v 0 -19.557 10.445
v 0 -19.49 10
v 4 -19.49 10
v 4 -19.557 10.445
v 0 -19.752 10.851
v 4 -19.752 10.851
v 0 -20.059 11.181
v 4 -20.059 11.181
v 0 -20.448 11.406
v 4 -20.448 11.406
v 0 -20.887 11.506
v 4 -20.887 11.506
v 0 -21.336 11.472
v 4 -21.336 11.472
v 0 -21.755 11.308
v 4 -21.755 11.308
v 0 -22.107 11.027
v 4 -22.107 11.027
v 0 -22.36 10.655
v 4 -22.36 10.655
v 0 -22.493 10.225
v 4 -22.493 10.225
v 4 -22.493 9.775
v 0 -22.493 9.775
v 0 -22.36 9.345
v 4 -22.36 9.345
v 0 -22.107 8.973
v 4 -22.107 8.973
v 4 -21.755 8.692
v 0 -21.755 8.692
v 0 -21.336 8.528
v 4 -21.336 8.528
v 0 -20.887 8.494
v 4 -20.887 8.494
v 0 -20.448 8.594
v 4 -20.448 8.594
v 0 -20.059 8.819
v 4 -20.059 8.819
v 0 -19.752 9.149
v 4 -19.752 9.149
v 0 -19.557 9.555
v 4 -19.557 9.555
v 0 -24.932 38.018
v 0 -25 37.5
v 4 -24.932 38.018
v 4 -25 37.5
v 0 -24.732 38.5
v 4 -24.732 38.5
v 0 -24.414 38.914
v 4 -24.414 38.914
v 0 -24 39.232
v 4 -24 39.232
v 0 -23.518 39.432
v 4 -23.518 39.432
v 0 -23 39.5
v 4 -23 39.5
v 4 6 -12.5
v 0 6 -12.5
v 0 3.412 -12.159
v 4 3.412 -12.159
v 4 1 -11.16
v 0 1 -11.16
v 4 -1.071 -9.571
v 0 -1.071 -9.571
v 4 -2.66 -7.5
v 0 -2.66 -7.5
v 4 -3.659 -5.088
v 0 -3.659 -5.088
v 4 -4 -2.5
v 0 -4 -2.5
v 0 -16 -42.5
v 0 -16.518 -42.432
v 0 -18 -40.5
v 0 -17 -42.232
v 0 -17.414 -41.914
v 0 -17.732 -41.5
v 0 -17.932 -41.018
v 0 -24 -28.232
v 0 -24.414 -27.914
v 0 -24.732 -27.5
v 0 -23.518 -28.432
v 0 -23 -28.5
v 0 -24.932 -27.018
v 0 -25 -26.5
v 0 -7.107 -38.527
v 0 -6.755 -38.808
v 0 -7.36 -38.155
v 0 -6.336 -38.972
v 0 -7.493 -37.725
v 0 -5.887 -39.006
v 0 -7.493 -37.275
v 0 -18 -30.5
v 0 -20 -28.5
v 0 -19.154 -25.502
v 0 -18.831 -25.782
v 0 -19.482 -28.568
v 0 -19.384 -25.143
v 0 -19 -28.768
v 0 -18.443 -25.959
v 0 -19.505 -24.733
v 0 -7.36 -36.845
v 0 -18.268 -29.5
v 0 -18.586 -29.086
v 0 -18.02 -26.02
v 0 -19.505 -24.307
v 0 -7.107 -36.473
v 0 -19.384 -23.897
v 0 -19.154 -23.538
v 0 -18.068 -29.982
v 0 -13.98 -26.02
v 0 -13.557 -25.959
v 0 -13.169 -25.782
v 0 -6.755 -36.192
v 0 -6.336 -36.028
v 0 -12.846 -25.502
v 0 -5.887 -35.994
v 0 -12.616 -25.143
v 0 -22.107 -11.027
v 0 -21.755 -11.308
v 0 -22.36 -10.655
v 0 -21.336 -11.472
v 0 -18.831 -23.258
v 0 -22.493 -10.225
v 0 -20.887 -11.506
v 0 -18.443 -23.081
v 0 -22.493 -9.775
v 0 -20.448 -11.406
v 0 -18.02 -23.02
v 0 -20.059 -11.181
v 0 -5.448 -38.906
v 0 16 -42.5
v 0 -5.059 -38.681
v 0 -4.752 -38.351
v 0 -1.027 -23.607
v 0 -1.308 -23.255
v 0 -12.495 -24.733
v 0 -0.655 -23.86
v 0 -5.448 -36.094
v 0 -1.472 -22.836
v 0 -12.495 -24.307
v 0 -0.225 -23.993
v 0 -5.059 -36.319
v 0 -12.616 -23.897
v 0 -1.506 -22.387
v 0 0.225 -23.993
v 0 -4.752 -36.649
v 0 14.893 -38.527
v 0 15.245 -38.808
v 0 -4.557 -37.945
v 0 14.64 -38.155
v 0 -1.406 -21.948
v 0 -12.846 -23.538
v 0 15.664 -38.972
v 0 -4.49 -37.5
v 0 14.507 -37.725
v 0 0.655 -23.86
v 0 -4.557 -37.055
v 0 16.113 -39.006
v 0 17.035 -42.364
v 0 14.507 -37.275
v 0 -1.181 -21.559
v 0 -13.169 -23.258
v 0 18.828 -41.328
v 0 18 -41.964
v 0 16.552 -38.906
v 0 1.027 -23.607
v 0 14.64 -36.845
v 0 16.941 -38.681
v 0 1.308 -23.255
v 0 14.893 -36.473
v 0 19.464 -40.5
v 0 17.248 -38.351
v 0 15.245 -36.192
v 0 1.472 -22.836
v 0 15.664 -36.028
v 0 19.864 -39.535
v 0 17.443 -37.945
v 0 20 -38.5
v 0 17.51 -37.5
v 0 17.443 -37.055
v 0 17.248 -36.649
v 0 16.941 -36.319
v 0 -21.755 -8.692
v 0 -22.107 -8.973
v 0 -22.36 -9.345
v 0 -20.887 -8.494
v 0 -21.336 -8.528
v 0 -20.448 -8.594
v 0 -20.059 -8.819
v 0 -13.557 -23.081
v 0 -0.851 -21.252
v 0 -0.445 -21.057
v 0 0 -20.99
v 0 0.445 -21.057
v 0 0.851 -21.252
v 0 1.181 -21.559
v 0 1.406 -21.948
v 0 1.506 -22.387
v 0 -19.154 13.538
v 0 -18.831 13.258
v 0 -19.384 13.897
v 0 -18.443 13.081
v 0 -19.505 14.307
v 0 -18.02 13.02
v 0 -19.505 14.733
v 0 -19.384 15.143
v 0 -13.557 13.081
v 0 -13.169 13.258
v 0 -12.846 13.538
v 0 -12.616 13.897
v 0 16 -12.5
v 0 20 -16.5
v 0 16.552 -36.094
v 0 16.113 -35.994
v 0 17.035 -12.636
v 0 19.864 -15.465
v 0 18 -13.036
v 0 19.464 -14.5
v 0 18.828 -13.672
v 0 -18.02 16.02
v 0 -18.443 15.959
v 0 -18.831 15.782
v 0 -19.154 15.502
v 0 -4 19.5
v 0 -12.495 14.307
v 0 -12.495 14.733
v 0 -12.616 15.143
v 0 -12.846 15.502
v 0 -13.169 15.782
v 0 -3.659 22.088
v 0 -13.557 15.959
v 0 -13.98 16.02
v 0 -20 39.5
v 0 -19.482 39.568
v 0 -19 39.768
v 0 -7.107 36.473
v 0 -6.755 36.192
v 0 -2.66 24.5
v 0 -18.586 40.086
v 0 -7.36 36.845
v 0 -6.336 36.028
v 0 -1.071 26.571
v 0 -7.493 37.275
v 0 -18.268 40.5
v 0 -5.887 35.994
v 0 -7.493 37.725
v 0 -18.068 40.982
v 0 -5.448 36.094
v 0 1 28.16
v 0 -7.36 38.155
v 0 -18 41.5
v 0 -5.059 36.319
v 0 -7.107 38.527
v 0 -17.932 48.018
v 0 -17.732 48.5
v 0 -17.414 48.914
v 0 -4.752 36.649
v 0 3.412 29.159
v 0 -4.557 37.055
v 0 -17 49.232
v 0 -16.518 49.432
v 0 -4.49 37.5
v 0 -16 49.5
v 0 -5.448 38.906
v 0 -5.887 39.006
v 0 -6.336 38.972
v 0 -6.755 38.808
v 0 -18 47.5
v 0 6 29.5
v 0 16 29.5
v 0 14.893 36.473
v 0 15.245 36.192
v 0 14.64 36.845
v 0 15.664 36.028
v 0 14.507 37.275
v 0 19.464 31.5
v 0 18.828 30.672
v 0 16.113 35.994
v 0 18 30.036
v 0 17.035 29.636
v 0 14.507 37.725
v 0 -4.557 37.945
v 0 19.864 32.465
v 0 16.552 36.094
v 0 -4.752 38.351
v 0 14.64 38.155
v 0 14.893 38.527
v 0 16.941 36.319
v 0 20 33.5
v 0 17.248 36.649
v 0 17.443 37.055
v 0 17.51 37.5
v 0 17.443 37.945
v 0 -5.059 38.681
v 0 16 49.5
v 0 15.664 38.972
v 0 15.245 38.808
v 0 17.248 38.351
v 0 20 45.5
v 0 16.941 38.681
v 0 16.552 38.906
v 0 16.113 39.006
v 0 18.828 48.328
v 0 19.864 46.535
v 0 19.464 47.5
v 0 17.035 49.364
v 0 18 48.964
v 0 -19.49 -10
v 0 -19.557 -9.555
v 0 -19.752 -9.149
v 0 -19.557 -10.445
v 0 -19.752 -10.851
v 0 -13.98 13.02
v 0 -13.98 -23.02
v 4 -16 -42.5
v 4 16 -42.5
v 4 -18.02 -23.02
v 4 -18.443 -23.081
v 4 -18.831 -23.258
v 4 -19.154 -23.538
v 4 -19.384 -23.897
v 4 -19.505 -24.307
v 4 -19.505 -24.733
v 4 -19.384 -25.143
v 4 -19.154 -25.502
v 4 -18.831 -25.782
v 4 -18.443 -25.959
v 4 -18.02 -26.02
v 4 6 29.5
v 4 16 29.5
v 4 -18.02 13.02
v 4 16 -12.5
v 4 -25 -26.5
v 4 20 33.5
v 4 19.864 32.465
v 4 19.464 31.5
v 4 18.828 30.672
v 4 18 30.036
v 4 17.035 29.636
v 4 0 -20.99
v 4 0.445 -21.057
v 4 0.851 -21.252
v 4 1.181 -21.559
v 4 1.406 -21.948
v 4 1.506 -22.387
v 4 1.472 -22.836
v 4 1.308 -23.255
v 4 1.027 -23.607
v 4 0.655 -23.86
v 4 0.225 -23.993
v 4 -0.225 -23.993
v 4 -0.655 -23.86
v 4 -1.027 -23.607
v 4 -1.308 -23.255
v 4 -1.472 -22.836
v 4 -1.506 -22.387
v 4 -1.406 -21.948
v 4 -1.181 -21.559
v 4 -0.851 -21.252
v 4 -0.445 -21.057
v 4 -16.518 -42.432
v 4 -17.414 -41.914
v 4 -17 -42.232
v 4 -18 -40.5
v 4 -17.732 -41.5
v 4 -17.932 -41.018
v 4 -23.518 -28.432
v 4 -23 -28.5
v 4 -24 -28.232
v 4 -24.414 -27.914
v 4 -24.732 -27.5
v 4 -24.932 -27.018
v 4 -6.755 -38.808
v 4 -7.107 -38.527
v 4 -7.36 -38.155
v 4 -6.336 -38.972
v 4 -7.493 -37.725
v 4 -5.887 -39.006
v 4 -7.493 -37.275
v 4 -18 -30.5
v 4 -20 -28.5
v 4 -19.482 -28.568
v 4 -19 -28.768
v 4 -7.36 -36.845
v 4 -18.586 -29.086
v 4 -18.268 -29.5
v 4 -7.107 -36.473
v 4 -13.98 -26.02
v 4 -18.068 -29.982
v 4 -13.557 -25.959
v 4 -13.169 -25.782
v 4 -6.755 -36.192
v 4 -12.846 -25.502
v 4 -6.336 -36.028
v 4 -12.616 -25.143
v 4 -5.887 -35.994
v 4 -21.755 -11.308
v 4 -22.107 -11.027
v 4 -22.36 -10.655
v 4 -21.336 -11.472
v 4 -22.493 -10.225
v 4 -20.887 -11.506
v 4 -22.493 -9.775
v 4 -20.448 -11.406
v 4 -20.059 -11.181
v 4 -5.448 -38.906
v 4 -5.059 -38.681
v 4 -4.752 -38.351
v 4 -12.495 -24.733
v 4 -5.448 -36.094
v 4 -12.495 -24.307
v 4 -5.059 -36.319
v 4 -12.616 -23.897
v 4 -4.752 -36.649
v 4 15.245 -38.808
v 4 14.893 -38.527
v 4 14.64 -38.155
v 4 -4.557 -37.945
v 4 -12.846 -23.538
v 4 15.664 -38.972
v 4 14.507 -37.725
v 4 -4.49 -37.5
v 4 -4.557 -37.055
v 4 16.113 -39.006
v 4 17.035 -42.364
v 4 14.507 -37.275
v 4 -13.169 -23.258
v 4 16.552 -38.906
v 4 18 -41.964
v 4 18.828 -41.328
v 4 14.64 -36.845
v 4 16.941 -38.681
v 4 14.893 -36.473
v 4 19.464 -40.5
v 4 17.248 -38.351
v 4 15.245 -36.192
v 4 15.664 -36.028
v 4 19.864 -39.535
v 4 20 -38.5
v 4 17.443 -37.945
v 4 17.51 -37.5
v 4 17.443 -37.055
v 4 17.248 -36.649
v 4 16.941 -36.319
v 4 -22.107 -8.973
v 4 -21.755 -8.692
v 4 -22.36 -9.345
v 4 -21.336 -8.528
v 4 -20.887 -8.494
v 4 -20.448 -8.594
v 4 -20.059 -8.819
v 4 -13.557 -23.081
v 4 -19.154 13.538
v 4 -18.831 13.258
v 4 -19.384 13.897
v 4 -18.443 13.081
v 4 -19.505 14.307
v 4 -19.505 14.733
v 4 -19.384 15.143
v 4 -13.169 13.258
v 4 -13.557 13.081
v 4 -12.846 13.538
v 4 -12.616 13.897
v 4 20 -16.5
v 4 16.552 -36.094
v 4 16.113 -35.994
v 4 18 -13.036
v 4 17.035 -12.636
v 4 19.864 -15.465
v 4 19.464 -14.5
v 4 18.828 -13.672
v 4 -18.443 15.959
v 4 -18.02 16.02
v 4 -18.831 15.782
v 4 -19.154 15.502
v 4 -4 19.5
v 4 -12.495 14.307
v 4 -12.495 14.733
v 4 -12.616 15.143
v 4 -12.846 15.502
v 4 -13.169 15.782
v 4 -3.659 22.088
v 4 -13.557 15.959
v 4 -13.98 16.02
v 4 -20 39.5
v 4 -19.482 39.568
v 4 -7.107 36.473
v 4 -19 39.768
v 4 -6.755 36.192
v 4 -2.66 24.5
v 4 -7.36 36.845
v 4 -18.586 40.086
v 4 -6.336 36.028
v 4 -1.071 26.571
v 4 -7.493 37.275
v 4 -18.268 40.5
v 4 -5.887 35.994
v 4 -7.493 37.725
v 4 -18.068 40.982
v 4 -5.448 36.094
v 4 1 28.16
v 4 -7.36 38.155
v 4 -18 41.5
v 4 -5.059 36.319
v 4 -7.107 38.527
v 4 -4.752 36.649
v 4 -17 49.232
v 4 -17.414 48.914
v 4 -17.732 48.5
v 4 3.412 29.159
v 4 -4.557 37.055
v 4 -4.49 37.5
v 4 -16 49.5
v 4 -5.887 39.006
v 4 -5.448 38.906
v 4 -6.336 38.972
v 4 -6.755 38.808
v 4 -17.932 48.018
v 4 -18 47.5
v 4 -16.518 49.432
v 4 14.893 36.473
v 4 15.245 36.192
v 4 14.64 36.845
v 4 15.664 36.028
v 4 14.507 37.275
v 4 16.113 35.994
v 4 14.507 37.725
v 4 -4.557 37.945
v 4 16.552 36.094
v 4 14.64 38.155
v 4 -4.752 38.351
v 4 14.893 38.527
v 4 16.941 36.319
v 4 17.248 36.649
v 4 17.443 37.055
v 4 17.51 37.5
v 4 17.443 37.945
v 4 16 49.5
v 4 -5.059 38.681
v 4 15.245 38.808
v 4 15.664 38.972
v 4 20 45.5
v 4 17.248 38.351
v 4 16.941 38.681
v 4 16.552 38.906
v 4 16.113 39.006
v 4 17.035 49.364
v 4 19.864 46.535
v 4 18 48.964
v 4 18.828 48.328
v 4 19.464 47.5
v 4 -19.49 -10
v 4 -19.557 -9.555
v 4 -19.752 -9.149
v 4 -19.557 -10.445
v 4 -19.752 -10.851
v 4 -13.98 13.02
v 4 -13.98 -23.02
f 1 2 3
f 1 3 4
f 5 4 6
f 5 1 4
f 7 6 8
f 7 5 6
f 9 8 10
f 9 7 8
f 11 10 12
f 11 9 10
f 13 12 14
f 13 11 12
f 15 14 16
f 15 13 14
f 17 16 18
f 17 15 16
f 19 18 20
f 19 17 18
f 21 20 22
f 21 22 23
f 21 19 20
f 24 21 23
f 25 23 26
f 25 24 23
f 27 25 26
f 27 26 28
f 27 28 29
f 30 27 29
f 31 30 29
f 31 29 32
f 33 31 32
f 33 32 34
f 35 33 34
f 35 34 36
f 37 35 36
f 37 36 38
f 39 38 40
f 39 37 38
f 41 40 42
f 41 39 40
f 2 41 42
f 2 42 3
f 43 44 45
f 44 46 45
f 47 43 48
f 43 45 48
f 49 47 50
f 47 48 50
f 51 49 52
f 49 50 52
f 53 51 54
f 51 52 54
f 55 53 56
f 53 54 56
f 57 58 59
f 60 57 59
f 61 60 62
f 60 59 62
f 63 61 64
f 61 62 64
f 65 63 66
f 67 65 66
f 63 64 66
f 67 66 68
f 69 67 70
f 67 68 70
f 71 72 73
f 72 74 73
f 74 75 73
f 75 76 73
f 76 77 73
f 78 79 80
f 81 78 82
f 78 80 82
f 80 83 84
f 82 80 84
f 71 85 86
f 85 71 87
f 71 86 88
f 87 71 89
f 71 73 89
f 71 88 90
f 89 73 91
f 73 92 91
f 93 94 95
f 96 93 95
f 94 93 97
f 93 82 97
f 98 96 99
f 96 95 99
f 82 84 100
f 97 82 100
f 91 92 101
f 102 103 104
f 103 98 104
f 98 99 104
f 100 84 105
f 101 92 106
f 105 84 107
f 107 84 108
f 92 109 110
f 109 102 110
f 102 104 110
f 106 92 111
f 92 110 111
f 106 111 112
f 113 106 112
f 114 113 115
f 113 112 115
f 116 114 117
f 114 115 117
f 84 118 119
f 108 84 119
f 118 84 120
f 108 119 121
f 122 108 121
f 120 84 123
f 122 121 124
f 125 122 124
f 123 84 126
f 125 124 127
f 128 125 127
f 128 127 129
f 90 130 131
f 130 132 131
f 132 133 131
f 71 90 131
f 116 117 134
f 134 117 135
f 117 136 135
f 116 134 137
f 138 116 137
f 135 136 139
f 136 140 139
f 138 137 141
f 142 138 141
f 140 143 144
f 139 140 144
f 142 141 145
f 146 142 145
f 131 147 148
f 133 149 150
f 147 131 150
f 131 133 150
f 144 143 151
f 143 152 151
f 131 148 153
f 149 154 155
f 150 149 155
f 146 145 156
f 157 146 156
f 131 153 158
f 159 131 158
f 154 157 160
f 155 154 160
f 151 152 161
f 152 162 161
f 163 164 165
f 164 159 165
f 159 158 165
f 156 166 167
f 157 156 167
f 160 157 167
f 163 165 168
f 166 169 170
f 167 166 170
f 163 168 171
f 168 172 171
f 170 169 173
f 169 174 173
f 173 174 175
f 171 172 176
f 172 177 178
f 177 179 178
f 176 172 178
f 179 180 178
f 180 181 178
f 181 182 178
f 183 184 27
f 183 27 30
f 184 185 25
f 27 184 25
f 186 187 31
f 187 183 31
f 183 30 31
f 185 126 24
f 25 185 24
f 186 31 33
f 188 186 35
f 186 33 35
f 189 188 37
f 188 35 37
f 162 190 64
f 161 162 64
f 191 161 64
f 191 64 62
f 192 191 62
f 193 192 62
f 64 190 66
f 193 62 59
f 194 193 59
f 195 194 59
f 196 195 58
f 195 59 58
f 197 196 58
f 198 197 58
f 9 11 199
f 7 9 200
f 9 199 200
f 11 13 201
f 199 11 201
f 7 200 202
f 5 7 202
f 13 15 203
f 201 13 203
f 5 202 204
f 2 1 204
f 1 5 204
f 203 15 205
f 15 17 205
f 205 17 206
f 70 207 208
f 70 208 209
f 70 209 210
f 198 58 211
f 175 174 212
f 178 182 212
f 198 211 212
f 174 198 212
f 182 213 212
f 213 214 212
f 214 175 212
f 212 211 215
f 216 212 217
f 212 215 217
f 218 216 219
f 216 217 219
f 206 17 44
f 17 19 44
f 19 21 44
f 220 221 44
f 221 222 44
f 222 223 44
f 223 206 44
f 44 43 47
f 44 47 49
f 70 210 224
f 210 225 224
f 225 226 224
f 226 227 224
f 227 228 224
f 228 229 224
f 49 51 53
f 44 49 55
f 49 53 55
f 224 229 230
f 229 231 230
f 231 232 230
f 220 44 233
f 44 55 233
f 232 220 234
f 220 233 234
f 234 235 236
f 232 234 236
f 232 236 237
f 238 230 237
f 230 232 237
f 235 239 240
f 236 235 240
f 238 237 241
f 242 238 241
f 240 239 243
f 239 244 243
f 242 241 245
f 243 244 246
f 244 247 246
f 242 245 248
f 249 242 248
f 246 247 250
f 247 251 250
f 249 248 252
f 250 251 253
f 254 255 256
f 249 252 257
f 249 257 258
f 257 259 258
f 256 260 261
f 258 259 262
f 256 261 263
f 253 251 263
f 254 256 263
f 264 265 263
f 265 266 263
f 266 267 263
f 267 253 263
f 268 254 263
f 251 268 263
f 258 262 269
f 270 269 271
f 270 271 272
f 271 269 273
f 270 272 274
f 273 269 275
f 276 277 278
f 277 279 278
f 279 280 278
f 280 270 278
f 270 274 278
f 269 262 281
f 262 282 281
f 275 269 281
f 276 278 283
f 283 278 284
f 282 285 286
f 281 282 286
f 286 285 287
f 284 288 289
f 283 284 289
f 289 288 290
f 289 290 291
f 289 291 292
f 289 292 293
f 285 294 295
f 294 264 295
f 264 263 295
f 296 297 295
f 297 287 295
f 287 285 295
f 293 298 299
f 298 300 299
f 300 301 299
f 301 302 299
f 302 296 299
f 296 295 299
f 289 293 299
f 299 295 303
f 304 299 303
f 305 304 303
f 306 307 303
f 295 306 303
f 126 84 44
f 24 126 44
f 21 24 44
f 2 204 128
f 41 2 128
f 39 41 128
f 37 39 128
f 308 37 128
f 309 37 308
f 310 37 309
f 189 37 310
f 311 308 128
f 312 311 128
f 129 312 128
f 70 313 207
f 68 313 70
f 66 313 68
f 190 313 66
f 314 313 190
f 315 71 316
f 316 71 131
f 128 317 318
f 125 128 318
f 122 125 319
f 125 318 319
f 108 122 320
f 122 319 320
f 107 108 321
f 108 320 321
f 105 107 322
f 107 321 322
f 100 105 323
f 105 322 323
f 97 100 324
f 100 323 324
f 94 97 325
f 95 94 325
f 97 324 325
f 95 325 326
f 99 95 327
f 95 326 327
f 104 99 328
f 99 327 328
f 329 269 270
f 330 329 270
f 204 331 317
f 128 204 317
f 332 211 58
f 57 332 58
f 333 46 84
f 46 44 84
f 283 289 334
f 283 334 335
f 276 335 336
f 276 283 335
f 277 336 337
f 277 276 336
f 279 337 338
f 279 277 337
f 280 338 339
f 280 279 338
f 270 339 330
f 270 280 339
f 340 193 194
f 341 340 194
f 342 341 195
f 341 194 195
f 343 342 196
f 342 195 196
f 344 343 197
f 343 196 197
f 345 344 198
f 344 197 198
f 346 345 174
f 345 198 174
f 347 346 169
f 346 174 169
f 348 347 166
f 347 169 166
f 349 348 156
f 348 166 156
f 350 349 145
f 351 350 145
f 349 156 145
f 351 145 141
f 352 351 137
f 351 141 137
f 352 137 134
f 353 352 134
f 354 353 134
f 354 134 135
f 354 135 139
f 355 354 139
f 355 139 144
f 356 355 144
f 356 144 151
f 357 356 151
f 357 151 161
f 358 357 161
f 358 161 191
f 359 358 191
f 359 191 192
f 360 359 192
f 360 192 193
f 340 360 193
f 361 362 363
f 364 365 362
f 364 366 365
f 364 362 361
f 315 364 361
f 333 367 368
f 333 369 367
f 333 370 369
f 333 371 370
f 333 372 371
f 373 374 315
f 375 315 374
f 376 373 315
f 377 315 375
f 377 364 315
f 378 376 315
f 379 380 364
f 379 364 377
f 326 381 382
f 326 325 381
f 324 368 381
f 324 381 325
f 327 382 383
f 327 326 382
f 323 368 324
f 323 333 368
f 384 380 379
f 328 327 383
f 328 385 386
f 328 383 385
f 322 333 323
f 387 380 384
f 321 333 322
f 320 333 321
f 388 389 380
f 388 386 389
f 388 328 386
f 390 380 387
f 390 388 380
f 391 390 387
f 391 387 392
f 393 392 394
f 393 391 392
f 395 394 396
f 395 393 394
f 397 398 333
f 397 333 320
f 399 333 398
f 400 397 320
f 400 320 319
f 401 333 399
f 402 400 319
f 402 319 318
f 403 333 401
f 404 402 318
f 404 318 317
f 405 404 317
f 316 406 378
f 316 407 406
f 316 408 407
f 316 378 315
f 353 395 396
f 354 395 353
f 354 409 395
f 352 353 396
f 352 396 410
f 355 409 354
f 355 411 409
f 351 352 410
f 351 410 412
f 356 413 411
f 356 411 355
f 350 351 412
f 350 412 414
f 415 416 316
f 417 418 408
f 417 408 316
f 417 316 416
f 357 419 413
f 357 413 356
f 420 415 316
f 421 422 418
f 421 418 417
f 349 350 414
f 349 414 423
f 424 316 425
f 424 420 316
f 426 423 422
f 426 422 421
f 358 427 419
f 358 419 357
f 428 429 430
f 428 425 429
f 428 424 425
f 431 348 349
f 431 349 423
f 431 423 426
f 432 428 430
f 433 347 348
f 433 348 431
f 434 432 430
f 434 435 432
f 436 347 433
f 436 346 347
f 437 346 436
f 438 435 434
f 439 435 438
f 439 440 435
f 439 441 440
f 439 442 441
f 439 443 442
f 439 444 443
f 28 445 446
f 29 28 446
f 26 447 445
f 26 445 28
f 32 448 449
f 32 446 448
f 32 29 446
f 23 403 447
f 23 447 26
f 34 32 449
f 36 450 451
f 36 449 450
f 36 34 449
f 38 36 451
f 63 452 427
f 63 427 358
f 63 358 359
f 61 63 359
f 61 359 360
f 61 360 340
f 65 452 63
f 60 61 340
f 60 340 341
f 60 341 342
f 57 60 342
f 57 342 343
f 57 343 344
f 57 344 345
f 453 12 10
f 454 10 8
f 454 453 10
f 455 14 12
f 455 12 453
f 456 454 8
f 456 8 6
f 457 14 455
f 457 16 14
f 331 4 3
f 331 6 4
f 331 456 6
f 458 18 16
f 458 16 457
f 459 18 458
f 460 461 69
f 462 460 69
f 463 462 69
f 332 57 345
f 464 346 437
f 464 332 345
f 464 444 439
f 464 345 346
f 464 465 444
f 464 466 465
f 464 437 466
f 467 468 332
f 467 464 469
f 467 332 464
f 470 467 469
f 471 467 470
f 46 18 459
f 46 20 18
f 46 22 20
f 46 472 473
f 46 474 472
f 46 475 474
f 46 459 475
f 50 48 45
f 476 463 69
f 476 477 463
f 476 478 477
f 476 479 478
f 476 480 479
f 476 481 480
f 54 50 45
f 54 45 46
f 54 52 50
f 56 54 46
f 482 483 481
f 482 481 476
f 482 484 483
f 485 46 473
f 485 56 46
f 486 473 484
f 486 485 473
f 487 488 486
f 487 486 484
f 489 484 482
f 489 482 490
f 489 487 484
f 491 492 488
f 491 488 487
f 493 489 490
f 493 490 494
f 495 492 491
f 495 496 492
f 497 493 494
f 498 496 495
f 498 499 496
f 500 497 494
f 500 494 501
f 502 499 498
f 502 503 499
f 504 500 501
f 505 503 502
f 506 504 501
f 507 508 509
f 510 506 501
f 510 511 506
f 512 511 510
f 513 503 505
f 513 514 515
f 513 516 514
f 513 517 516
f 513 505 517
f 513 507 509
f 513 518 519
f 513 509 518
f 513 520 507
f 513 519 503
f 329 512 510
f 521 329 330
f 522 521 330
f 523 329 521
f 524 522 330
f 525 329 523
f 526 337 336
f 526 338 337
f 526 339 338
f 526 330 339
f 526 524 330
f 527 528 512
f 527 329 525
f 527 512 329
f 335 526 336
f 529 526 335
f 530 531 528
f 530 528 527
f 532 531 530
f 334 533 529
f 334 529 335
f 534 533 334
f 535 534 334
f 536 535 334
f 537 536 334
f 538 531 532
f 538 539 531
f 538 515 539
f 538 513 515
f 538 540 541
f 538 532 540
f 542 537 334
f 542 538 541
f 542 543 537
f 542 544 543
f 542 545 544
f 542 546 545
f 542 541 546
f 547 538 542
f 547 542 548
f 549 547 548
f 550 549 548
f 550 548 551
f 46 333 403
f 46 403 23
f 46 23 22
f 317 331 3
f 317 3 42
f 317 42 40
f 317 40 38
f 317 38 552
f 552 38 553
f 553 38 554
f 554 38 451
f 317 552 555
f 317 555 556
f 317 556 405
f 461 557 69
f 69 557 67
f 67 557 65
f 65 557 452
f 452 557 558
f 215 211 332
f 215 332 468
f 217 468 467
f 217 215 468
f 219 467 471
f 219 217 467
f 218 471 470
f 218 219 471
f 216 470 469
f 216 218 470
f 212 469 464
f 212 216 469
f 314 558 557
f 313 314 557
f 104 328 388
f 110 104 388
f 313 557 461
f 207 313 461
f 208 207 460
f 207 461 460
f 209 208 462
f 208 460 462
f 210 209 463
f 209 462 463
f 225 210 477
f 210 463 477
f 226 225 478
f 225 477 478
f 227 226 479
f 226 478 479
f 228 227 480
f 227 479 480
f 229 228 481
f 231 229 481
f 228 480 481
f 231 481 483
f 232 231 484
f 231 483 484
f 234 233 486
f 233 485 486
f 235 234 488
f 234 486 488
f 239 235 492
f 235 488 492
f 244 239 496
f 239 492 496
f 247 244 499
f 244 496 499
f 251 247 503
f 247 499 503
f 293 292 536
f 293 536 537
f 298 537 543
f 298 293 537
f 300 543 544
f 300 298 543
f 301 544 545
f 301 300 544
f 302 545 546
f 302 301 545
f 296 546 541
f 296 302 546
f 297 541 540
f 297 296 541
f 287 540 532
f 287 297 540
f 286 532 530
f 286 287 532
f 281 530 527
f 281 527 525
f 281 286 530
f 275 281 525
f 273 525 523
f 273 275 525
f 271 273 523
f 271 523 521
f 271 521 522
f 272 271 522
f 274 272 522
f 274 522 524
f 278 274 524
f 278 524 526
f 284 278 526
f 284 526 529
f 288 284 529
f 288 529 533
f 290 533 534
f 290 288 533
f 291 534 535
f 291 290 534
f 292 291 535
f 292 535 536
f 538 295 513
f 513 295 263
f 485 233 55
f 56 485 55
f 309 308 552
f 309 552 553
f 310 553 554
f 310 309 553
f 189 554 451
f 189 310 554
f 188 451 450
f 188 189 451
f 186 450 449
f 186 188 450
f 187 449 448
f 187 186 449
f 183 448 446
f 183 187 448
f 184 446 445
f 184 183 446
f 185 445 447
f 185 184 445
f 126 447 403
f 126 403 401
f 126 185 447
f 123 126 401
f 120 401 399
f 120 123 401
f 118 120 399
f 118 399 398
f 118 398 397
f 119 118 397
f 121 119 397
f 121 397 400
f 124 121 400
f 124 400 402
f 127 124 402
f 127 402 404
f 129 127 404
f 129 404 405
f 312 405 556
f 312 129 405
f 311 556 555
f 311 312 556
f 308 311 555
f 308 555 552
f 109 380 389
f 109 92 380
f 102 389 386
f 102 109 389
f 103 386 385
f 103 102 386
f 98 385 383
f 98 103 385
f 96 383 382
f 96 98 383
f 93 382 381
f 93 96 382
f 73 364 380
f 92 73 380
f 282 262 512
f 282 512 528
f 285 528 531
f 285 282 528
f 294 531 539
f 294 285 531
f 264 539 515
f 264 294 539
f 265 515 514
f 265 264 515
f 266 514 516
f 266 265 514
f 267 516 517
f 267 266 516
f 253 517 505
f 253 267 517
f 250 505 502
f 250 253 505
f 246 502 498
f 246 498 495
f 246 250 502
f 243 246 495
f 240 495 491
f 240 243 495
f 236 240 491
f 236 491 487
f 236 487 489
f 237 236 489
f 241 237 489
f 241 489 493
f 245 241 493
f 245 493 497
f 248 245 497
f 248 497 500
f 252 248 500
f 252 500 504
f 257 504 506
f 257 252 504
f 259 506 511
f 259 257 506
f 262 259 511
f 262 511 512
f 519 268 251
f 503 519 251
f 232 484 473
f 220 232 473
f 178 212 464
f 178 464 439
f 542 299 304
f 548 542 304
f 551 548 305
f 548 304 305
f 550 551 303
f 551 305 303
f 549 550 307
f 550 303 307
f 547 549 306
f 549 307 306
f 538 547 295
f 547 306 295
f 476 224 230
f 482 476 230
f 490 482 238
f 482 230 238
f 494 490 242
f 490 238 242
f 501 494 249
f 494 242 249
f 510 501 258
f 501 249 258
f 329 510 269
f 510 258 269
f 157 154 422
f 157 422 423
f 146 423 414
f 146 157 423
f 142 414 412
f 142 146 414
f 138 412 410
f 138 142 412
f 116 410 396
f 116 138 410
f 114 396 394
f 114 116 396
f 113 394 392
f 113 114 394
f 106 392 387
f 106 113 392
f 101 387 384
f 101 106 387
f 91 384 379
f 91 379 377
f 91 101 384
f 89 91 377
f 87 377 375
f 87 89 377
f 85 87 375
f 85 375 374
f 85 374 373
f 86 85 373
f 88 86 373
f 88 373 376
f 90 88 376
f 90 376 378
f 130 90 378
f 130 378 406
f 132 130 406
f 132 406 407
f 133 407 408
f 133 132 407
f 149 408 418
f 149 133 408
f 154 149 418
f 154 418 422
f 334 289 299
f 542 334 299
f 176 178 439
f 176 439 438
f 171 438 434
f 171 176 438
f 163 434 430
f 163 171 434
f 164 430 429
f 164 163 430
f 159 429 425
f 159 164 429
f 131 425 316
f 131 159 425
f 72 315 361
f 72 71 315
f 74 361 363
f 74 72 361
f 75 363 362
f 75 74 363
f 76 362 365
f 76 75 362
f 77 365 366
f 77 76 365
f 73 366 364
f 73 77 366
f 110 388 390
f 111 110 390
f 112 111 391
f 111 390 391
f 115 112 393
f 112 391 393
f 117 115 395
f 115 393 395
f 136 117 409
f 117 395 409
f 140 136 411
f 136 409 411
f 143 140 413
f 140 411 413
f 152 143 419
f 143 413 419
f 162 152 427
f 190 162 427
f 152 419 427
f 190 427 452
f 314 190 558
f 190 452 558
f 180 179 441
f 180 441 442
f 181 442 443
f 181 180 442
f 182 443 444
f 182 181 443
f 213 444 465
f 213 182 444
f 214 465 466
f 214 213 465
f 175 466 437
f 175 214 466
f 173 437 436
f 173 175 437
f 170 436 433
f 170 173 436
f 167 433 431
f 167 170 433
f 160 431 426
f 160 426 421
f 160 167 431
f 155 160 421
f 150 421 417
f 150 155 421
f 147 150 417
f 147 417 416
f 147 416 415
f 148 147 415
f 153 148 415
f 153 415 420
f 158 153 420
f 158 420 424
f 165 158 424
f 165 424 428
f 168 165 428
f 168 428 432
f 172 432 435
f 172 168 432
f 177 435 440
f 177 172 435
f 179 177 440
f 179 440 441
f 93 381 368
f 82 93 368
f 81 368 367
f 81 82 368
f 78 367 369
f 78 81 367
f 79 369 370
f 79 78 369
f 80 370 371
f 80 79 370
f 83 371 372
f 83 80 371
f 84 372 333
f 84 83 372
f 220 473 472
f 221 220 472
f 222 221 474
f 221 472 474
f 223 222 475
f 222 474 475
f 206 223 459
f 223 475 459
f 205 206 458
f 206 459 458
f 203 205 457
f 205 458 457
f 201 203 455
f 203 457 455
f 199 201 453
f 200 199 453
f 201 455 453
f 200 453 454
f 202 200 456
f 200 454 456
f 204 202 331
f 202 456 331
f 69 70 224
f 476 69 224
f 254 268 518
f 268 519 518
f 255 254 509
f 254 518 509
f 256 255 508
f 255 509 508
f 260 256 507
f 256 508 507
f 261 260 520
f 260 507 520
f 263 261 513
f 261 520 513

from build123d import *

# Parameters (mm, degrees)
SKETCH_1_W              = 85
SKETCH_1_H              = 40
EXTRUDE_1_DEPTH         = 4
SKETCH_2_R              = 1.51
CUT_EXTRUDE_1_DEPTH     = 10
SKETCH_3_R              = 1.51
CUT_EXTRUDE_2_DEPTH     = 10
SKETCH_5_R              = 1.51
CUT_EXTRUDE_4_DEPTH     = 10
SKETCH_6_W              = 85
SKETCH_6_H              = 25
EXTRUDE_2_DEPTH         = 4
SKETCH_7_R              = 1.51
CUT_EXTRUDE_5_DEPTH     = 3
CUT_EXTRUDE_START       = -3
SKETCH_8_R              = 1.51
CUT_EXTRUDE_6_DEPTH     = 3
CUT_EXTRUDE_7_DEPTH     = 10
SKETCH_10_R             = 1.5
CUT_EXTRUDE_8_DEPTH     = 10
SKETCH_12_OUTSIDE_W     = 108.416
SKETCH_12_OUTSIDE_H     = 88.416
CUT_EXTRUDE_9_DEPTH     = 10
SKETCH_13_W             = 85
SKETCH_13_H             = 20
CUT_EXTRUDE_10_DEPTH    = 10
FILLET_2_R              = 4
MOVE_FACE_1_DEPTH       = 4
MOVE_FACE_2_OUTLINE_R   = 1.51
MOVE_FACE_2_DEPTH       = 4
MOVE_FACE_2_2_OUTLINE_R = 1.51
MOVE_FACE_2_2_DEPTH     = 4
MOVE_FACE_3_OUTLINE_R   = 1.51
MOVE_FACE_3_DEPTH       = 4
MOVE_FACE_3_2_OUTLINE_R = 1.51
MOVE_FACE_3_2_DEPTH     = 4
CUT_EXTRUDE_11_DEPTH    = 10
FILLET_3_R              = 2
CUT_EXTRUDE_12_DEPTH    = 10
FILLET_4_R              = 2


# Read off the part's stored shape, not the designer's step: 移动面1, 移动面2, 移动面3
with BuildPart() as part:
    # 草图1 → 凸台-拉伸1 (new body)
    with BuildSketch(Plane(origin=(0, 0, 0), x_dir=(0, 0, -1), z_dir=(1, 0, 0))):
        Rectangle(SKETCH_1_W, SKETCH_1_H)
    extrude(amount=EXTRUDE_1_DEPTH)

    # 草图2 → 切除-拉伸1 (cut)
    with BuildSketch(Plane.ZY):
        with Locations((-37.5, -11)):
            Circle(SKETCH_2_R)
        with Locations((37.5, -11)):
            Circle(SKETCH_2_R)
        with Locations((37.5, 11)):
            Circle(SKETCH_2_R)
        with Locations((-37.5, 11)):
            Circle(SKETCH_2_R)
    extrude(amount=-CUT_EXTRUDE_1_DEPTH, mode=Mode.SUBTRACT)

    # 草图3 → 切除-拉伸2 (cut)
    with BuildSketch(Plane.ZY):
        with Locations((-2.5, 0)):
            Circle(SKETCH_3_R)
        with Locations((-22.5, 0)):
            Circle(SKETCH_3_R)
    extrude(amount=-CUT_EXTRUDE_2_DEPTH, mode=Mode.SUBTRACT)

    # 草图5 → 切除-拉伸4 (cut)
    with BuildSketch(Plane.ZY):
        with BuildLine():
            Line((29.5, 6), (29.5, 20))
            Line((29.5, 20), (-12.5, 20))
            Line((-12.5, 20), (-12.5, 6))
            ThreePointArc((-12.5, 6), (-9.571067812, -1.071067812), (-2.5, -4))
            Line((-2.5, -4), (19.5, -4))
            ThreePointArc((19.5, -4), (26.571067812, -1.071067812), (29.5, 6))
        make_face()
        with Locations((-2.5, 0)):
            Circle(SKETCH_5_R, mode=Mode.SUBTRACT)
    extrude(amount=-CUT_EXTRUDE_4_DEPTH, mode=Mode.SUBTRACT)

    # 草图6 → 凸台-拉伸2 (add)
    with BuildSketch(Plane.ZY):
        with Locations((0, -32.5)):
            Rectangle(SKETCH_6_W, SKETCH_6_H)
    extrude(amount=-EXTRUDE_2_DEPTH)

    # 草图7 → 切除-拉伸5 (cut)
    with BuildSketch(Plane(origin=(4, 0, 0), x_dir=(0, 0, -1), z_dir=(1, 0, 0))):
        with Locations((-10, -11)):
            Circle(SKETCH_7_R)
        with Locations((10, -11)):
            Circle(SKETCH_7_R)
    extrude(amount=-CUT_EXTRUDE_5_DEPTH, mode=Mode.SUBTRACT)

    # 草图8 → 切除-拉伸6 (cut)
    with BuildSketch(Plane.ZY.offset(CUT_EXTRUDE_START)):
        with Locations(Location((-10, -11, 0), (0, 0, 180))):
            Circle(SKETCH_8_R)
        with Locations(Location((10, -11, 0), (0, 0, 180))):
            Circle(SKETCH_8_R)
    extrude(amount=CUT_EXTRUDE_6_DEPTH, mode=Mode.SUBTRACT)

    # 草图9 → 切除-拉伸7 (cut)
    with BuildSketch(Plane(origin=(4, 0, 0), x_dir=(0, 0, -1), z_dir=(1, 0, 0))):
        Polygon((26, -14), (17.872575328, -14), (-2.448990482, -14), (-16, -14), (-16, -18), (-14, -18), (24, -18), (26, -18), align=None)
    extrude(amount=-CUT_EXTRUDE_7_DEPTH, mode=Mode.SUBTRACT)

    # 草图10 → 切除-拉伸8 (cut)
    with BuildSketch(Plane(origin=(4, 0, 0), x_dir=(0, 0, -1), z_dir=(1, 0, 0))):
        with Locations((24.52, -18.02)):
            Circle(SKETCH_10_R)
        with Locations((-14.52, -18.02)):
            Circle(SKETCH_10_R)
        with Locations((-14.52, -13.98)):
            Circle(SKETCH_10_R)
        with Locations((24.52, -13.98)):
            Circle(SKETCH_10_R)
        Polygon((26.02, -13.98), (17.872575328, -13.98), (-2.448990482, -13.98), (-16.02, -13.98), (-16.02, -18.02), (-14, -18.02), (24, -18.02), (26.02, -18.02), align=None)
    extrude(amount=-CUT_EXTRUDE_8_DEPTH, mode=Mode.SUBTRACT)

    # 草图12 outside → 切除-拉伸9 (cut)
    with BuildSketch(Plane.ZY):
        with Locations((0, -12.5)):
            Rectangle(SKETCH_12_OUTSIDE_W, SKETCH_12_OUTSIDE_H)
        with BuildLine():
            Line((-12.5, 6), (-12.5, 16))
            ThreePointArc((-12.5, 16), (-13.671572875, 18.828427125), (-16.5, 20))
            Line((-16.5, 20), (-38.5, 20))
            ThreePointArc((-38.5, 20), (-41.328427125, 18.828427125), (-42.5, 16))
            Line((-42.5, 16), (-42.5, -45))
            Line((-42.5, -45), (42.5, -45))
            Line((42.5, -45), (42.5, 16))
            ThreePointArc((42.5, 16), (41.328427125, 18.828427125), (38.5, 20))
            Line((38.5, 20), (33.5, 20))
            ThreePointArc((33.5, 20), (30.671572875, 18.828427125), (29.5, 16))
            Line((29.5, 16), (29.5, 6))
            ThreePointArc((29.5, 6), (26.571067812, -1.071067812), (19.5, -4))
            Line((19.5, -4), (-2.5, -4))
            ThreePointArc((-2.5, -4), (-9.571067812, -1.071067812), (-12.5, 6))
        make_face(mode=Mode.SUBTRACT)
    extrude(amount=-CUT_EXTRUDE_9_DEPTH, mode=Mode.SUBTRACT)

    # 草图13 → 切除-拉伸10 (cut)
    with BuildSketch(Plane.ZY):
        with Locations((0, -35)):
            Rectangle(SKETCH_13_W, SKETCH_13_H)
    extrude(amount=-CUT_EXTRUDE_10_DEPTH, mode=Mode.SUBTRACT)

    # 圆角2
    fillet_2_edges = [part.edges().sort_by_distance(p)[0] for p in [
        (2, -25, 42.5),
        (2, -25, -42.5),
    ]]
    fillet(fillet_2_edges, radius=FILLET_2_R)

    # Move Face 1 outline → Move Face 1 (add)
    with BuildSketch(Plane.YZ):
        with BuildLine():
            Line((20, 38.5), (20, 45.5))
            ThreePointArc((20, 45.5), (18.828427125, 48.328427125), (16, 49.5))
            Line((16, 49.5), (-21, 49.5))
            ThreePointArc((-21, 49.5), (-23.828427125, 48.328427125), (-25, 45.5))
            Line((-25, 45.5), (-25, 38.5))
            ThreePointArc((-25, 38.5), (-23.828427125, 41.328427125), (-21, 42.5))
            Line((-21, 42.5), (16, 42.5))
            ThreePointArc((16, 42.5), (18.828427125, 41.328427125), (20, 38.5))
        make_face()
    extrude(amount=MOVE_FACE_1_DEPTH)

    # Move Face 2 outline → Move Face 2 (cut)
    with BuildSketch(Plane.YZ):
        with Locations((-21, -10)):
            Circle(MOVE_FACE_2_OUTLINE_R)
        with Locations((-21, 10)):
            Circle(MOVE_FACE_2_OUTLINE_R)
    extrude(amount=MOVE_FACE_2_DEPTH, mode=Mode.SUBTRACT)

    # Move Face 2 2 outline → Move Face 2 2 (add)
    with BuildSketch(Plane.YZ):
        with Locations((-11, -10)):
            Circle(MOVE_FACE_2_2_OUTLINE_R)
        with Locations((-11, 10)):
            Circle(MOVE_FACE_2_2_OUTLINE_R)
    extrude(amount=MOVE_FACE_2_2_DEPTH)

    # Move Face 3 outline → Move Face 3 (cut)
    with BuildSketch(Plane.YZ):
        with Locations((-6, -37.5)):
            Circle(MOVE_FACE_3_OUTLINE_R)
        with Locations((-6, 37.5)):
            Circle(MOVE_FACE_3_OUTLINE_R)
        with Locations((16, 37.5)):
            Circle(MOVE_FACE_3_OUTLINE_R)
        with Locations((16, -37.5)):
            Circle(MOVE_FACE_3_OUTLINE_R)
    extrude(amount=MOVE_FACE_3_DEPTH, mode=Mode.SUBTRACT)

    # Move Face 3 2 outline → Move Face 3 2 (add)
    with BuildSketch(Plane.YZ):
        with Locations((-11, -37.5)):
            Circle(MOVE_FACE_3_2_OUTLINE_R)
        with Locations((-11, 37.5)):
            Circle(MOVE_FACE_3_2_OUTLINE_R)
        with Locations((11, 37.5)):
            Circle(MOVE_FACE_3_2_OUTLINE_R)
        with Locations((11, -37.5)):
            Circle(MOVE_FACE_3_2_OUTLINE_R)
    extrude(amount=MOVE_FACE_3_2_DEPTH)

    # 草图14 → 切除-拉伸11 (cut)
    with BuildSketch(Plane(origin=(4, 0, 0), x_dir=(0, 0, -1), z_dir=(1, 0, 0))):
        with BuildLine():
            Line((42.5, -21), (42.5, -18))
            Line((42.5, -18), (28.5, -18))
            Line((28.5, -18), (28.5, -25))
            Line((28.5, -25), (38.5, -25))
            ThreePointArc((38.5, -25), (41.328427125, -23.828427125), (42.5, -21))
        make_face()
    extrude(amount=-CUT_EXTRUDE_11_DEPTH, mode=Mode.SUBTRACT)

    # 圆角3
    fillet_3_edges = [part.edges().sort_by_distance(p)[0] for p in [
        (2, -18, -28.5),
        (2, -25, -28.5),
        (2, -18, -42.5),
    ]]
    fillet(fillet_3_edges, radius=FILLET_3_R)

    # 草图16 → 切除-拉伸12 (cut)
    with BuildSketch(Plane.ZY):
        with BuildLine():
            Line((49.5, -18), (39.5, -18))
            Line((39.5, -18), (39.5, -25))
            Line((39.5, -25), (45.5, -25))
            ThreePointArc((45.5, -25), (48.328427125, -23.828427125), (49.5, -21))
            Line((49.5, -21), (49.5, -18))
        make_face()
    extrude(amount=-CUT_EXTRUDE_12_DEPTH, mode=Mode.SUBTRACT)

    # 圆角4
    fillet_4_edges = [part.edges().sort_by_distance(p)[0] for p in [
        (2, -18, 39.5),
        (2, -18, 49.5),
        (2, -25, 39.5),
    ]]
    fillet(fillet_4_edges, radius=FILLET_4_R)


solid = part.part
